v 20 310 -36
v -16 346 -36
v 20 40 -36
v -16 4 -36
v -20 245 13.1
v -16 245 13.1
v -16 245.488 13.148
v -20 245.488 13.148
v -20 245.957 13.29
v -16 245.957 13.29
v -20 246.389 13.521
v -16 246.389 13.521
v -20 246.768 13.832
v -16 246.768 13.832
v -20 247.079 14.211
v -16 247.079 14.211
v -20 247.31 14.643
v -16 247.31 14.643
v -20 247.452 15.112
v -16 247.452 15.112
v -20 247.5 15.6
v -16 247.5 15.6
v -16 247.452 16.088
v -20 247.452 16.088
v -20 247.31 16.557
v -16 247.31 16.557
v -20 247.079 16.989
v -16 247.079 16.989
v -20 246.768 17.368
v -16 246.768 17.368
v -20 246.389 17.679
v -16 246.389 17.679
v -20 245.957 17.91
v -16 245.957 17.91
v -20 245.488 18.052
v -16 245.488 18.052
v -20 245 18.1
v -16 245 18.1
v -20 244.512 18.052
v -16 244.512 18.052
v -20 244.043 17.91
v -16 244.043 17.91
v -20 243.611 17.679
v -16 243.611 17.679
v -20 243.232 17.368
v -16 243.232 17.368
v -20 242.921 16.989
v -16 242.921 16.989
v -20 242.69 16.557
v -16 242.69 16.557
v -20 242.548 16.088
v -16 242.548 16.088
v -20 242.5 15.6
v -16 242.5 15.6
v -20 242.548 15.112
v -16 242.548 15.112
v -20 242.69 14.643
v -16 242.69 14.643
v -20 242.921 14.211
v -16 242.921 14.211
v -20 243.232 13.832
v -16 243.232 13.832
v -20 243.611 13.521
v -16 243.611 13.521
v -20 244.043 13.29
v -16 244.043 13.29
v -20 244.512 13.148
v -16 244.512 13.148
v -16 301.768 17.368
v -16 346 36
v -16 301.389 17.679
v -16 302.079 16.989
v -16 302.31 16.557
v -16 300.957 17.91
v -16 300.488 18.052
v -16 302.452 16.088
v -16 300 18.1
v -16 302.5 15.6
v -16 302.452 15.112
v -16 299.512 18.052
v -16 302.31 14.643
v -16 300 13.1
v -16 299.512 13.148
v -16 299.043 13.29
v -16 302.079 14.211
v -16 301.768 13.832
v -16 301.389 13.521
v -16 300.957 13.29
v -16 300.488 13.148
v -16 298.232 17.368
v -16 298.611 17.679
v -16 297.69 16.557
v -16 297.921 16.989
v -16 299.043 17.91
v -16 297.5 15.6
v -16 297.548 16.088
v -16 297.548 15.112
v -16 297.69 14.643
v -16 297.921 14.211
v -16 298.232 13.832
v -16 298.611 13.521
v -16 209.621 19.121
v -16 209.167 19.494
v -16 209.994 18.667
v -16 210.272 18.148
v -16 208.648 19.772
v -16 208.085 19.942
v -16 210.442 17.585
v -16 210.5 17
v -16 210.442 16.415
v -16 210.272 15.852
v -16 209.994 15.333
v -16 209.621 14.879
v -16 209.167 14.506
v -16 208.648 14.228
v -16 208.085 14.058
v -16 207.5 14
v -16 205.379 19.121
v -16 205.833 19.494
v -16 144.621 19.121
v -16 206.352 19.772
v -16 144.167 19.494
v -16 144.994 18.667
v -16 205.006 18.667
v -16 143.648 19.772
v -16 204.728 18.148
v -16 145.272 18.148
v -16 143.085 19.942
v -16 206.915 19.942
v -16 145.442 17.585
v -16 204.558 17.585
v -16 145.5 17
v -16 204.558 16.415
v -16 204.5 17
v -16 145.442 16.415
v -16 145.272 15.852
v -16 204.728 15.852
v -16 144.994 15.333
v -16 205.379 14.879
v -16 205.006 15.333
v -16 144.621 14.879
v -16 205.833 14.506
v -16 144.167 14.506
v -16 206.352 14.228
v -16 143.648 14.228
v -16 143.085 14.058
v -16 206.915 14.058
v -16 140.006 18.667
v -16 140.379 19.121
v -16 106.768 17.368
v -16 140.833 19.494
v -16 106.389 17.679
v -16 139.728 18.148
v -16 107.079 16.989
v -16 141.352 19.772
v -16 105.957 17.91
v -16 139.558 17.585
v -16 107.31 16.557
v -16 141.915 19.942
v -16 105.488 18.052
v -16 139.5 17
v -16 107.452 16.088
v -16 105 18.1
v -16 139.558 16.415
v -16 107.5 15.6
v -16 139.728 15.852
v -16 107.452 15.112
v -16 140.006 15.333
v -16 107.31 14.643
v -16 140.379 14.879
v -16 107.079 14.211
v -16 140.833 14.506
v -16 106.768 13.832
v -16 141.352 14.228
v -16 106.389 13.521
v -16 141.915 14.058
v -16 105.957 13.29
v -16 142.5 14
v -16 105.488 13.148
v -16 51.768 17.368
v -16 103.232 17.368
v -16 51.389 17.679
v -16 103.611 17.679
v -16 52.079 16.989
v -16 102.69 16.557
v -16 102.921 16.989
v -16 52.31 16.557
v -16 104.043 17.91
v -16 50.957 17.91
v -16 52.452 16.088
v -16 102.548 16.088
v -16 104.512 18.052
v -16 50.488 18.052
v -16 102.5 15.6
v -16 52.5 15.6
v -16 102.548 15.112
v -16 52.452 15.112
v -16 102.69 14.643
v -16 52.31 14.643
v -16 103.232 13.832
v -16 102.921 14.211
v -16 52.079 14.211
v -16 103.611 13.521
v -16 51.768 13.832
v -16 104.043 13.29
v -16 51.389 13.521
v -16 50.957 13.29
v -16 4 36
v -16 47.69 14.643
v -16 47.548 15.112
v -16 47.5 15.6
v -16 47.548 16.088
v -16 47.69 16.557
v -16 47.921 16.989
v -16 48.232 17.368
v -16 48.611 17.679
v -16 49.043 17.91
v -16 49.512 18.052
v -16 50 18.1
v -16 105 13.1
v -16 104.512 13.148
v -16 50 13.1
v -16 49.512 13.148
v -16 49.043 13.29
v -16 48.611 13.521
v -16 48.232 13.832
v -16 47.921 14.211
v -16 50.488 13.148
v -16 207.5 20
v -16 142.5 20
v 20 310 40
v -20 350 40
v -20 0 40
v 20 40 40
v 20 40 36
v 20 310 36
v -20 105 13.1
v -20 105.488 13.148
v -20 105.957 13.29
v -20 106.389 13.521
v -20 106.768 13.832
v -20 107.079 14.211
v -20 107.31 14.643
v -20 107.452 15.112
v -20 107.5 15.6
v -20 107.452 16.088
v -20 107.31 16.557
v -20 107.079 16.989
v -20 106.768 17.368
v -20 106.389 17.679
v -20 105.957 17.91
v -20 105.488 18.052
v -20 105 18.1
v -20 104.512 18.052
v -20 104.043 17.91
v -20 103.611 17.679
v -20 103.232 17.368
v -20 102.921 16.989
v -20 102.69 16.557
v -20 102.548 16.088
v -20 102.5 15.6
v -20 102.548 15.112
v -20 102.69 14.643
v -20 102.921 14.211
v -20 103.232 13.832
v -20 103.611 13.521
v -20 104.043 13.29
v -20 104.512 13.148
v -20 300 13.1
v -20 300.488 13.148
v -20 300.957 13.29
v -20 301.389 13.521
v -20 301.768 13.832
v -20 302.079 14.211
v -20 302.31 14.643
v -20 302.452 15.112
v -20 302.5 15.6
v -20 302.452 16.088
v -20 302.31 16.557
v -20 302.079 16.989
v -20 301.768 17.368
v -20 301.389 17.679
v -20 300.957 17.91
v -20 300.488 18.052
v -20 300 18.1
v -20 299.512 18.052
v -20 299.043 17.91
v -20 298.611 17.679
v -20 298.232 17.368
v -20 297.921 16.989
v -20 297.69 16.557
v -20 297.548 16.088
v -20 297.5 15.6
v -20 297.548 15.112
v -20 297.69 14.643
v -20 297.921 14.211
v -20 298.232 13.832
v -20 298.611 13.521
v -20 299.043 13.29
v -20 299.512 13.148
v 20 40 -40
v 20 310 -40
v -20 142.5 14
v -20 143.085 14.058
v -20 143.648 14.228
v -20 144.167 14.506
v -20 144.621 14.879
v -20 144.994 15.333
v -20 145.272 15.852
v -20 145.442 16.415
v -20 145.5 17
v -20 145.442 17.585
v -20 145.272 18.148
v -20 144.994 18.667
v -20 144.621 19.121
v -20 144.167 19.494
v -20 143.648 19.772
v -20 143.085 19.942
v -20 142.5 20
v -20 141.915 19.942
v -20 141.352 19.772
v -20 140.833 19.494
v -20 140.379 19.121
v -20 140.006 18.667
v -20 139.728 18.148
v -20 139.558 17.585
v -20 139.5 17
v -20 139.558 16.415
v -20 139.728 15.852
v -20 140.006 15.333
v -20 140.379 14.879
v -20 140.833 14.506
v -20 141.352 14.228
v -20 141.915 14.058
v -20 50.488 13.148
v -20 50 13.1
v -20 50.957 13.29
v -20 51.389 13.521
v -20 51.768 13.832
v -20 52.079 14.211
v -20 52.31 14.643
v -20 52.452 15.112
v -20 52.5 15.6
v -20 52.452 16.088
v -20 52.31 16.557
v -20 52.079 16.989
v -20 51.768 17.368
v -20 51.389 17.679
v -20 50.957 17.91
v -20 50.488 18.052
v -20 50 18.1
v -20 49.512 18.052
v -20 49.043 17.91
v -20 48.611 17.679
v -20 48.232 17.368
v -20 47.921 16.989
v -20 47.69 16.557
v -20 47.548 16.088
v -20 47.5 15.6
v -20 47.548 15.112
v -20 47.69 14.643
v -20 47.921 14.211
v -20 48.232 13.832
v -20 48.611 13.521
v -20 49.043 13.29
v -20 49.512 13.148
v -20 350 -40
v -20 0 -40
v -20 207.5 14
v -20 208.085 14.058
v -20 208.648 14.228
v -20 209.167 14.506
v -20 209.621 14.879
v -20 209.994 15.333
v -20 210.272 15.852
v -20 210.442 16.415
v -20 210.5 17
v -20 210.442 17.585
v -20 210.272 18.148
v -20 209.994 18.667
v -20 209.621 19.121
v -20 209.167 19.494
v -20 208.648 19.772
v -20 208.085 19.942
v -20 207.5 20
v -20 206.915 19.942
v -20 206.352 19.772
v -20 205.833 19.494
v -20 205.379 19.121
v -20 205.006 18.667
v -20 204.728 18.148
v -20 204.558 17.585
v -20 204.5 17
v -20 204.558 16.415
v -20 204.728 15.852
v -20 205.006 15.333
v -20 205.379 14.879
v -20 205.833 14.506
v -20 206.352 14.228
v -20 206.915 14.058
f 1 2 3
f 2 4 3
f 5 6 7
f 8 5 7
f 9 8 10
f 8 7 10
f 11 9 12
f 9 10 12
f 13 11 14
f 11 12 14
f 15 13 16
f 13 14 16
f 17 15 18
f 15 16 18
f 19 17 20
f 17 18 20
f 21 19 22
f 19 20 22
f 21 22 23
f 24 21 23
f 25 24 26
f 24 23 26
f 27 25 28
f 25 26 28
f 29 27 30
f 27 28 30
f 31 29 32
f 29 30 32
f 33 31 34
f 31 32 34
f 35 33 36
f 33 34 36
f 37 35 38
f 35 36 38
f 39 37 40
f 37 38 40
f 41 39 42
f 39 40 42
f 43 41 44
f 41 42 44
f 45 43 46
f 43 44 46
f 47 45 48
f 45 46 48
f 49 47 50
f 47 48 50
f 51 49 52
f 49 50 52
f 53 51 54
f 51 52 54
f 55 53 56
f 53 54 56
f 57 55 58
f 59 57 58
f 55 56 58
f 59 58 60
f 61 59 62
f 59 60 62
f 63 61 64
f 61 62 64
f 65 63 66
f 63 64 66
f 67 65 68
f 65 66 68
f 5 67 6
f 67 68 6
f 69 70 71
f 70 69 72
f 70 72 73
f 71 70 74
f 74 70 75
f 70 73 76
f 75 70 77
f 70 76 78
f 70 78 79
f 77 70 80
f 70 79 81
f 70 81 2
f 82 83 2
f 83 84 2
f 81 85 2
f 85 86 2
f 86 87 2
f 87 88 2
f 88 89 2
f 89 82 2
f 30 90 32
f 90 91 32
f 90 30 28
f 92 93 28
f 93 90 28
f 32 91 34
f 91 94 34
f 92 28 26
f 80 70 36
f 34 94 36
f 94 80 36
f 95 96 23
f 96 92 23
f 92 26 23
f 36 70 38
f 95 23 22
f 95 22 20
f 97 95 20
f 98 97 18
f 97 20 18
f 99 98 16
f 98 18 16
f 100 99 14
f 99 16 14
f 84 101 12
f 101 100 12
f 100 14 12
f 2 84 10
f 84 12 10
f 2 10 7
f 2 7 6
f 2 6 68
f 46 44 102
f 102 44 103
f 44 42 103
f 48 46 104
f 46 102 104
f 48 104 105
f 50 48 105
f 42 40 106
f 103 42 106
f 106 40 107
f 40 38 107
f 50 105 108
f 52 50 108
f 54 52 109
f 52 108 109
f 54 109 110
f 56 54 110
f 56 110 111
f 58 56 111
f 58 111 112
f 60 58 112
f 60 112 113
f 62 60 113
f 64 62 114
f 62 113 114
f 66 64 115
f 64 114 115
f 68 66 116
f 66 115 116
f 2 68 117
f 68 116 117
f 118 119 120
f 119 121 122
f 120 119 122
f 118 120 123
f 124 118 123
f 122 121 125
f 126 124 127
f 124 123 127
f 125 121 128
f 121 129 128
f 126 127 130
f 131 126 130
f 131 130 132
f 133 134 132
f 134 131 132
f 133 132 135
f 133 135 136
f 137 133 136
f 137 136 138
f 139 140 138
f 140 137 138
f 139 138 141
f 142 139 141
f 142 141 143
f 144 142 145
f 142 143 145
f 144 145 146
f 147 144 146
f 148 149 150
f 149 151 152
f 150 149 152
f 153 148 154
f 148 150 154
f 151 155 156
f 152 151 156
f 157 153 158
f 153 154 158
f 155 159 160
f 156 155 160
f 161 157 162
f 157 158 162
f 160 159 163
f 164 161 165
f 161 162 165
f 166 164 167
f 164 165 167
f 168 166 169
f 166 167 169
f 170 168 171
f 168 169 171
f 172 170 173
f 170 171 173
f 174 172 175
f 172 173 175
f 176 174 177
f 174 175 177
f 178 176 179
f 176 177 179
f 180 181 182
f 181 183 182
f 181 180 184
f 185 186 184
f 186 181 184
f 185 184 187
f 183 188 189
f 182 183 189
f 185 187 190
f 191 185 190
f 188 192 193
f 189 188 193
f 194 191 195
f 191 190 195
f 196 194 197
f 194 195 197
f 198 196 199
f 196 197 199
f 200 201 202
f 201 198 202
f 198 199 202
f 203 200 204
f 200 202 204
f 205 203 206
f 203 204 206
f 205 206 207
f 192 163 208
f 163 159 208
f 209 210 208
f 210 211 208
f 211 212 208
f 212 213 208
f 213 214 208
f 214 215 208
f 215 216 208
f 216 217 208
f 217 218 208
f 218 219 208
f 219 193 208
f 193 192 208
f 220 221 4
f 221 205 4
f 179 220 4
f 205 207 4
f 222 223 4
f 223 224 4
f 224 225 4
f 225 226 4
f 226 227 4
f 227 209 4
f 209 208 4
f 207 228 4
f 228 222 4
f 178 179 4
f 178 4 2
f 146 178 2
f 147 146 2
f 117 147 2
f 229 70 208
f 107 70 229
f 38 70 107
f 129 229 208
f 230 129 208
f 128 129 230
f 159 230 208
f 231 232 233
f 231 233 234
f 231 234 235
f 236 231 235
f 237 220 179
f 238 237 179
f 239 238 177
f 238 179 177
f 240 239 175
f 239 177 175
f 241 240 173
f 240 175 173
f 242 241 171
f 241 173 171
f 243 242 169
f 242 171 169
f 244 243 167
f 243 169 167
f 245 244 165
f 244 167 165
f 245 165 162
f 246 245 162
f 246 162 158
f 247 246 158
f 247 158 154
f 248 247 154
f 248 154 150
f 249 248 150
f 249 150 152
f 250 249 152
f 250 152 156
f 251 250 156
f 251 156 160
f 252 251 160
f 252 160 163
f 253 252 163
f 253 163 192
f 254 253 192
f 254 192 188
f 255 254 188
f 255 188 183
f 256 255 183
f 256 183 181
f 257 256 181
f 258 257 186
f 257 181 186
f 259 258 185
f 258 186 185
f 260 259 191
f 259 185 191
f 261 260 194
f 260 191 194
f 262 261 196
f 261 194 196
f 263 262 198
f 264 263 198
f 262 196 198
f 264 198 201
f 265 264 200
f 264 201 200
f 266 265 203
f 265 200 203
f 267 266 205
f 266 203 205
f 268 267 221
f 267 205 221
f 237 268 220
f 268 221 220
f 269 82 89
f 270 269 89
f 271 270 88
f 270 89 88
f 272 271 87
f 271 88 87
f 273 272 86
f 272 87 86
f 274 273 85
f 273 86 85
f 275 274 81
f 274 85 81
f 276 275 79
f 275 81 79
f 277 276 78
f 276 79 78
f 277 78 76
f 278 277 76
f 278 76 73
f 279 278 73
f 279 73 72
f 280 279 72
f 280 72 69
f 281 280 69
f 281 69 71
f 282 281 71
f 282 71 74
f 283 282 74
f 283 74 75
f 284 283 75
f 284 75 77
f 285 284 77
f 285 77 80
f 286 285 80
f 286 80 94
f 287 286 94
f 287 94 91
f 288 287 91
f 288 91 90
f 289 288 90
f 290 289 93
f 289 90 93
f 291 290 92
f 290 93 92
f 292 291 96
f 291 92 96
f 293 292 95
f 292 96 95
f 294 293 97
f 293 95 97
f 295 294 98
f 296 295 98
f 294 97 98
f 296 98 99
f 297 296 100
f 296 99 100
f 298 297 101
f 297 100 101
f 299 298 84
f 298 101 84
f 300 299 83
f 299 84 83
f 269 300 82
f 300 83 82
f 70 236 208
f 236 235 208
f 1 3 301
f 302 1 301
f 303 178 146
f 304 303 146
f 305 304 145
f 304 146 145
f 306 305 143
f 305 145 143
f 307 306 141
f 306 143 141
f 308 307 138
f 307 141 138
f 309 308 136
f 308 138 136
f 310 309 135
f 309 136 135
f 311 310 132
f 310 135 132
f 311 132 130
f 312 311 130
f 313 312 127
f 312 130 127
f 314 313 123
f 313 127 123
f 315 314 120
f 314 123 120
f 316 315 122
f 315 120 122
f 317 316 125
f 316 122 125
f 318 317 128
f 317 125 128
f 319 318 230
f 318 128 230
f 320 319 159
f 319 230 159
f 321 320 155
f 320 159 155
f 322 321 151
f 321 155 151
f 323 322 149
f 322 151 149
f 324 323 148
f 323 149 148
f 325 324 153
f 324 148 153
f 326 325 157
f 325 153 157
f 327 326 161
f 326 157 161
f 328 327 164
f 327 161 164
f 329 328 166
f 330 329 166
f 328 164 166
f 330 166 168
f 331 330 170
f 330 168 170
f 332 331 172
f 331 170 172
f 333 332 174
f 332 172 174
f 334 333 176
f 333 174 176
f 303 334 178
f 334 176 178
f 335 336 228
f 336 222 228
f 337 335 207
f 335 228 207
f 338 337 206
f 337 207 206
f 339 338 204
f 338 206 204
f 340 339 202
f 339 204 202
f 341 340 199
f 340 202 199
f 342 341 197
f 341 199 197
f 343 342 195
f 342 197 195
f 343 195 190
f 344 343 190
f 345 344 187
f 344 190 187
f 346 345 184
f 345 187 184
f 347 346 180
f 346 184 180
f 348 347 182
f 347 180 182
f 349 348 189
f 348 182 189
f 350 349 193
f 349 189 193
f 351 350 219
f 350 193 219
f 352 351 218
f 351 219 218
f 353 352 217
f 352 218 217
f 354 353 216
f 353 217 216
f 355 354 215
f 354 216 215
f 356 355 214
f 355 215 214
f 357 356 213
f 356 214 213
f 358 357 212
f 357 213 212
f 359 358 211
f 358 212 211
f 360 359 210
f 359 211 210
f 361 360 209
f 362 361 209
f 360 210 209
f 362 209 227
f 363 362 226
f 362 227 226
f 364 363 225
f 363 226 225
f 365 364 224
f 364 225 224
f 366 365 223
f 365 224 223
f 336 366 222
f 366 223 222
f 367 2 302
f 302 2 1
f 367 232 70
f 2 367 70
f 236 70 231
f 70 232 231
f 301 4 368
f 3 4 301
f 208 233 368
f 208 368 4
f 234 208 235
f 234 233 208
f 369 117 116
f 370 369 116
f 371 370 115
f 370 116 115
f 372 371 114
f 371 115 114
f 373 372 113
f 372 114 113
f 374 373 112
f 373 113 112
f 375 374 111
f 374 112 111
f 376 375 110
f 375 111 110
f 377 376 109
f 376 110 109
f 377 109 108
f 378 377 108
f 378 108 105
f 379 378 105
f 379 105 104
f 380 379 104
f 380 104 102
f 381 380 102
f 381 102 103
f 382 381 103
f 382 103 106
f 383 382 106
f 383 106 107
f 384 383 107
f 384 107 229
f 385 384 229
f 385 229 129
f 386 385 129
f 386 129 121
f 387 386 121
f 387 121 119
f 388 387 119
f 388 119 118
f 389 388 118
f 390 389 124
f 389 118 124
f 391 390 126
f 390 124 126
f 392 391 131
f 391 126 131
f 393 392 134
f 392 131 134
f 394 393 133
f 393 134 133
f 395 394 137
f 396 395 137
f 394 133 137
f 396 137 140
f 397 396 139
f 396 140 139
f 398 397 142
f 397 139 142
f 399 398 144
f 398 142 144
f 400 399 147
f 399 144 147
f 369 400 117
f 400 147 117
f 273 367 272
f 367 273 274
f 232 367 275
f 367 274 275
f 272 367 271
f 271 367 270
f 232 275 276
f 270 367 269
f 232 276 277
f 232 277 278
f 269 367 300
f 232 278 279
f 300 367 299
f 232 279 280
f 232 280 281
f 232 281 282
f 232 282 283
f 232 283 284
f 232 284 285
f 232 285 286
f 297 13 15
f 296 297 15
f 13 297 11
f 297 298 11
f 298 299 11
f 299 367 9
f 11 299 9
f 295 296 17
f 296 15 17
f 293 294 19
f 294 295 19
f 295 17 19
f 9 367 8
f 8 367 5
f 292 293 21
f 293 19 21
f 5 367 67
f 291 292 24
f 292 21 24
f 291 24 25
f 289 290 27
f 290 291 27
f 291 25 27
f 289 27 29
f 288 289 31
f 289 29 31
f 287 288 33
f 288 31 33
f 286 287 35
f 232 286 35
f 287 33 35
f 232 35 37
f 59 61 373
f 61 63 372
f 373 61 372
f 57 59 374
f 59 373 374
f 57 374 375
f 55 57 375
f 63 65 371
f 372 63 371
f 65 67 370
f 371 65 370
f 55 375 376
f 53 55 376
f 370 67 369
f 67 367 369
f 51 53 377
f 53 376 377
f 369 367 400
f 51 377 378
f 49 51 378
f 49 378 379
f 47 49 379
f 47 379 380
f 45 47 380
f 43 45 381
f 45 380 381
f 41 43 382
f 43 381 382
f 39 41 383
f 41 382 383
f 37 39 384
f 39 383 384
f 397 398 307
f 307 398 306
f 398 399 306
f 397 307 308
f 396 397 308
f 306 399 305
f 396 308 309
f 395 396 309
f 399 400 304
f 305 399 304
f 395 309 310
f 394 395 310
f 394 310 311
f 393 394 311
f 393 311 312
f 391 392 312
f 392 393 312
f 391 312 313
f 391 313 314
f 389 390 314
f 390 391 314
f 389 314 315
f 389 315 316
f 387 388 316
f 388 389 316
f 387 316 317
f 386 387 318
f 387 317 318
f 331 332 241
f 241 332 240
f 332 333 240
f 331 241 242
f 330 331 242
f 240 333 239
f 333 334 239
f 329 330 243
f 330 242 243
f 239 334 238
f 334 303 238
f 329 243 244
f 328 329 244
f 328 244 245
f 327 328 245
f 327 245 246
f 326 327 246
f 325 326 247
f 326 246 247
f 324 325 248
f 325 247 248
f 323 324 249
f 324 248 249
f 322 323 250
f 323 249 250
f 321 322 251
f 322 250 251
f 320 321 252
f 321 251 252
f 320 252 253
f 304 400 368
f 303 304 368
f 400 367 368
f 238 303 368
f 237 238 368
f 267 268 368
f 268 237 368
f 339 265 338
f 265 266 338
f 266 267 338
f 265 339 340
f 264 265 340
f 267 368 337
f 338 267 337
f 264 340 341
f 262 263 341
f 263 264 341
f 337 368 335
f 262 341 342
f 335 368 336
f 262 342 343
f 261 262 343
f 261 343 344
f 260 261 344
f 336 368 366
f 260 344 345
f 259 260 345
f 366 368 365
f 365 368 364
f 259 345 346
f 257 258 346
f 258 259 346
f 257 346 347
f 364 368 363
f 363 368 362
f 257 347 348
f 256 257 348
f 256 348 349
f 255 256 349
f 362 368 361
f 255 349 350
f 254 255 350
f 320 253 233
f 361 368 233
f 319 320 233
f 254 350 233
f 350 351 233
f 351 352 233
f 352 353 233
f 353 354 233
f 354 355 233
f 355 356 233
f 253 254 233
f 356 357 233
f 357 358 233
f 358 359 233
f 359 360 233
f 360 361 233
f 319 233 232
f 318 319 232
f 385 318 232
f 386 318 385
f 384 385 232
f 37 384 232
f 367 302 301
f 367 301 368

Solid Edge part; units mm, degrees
sketch "Sketch1" plane through (0, 0, 0) normal (0, -1, 0) x (1, 0, 0)
  line L0 (20, 36) -> (-16, 36)
  line L1 (-16, 36) -> (-16, -36)
  line L2 (-16, -36) -> (20, -36)
  line L3 (20, -36) -> (20, -40)
  line L4 (20, -40) -> (-20, -40)
  line L5 (-20, -40) -> (-20, 40)
  line L6 (-20, 40) -> (20, 40)
  line L7 (20, 40) -> (20, 36)
  dimension "D1" = 80
  dimension "D2" = 40
  dimension "D3" = 4
  dimension "D4" = 4
extrude "Protrusion1" add sketch "Sketch1" against normal blind 350
sketch "Sketch2" plane through (0, 175, 40) normal (0, 0, 1) x (0, 1, 0)
  line L0 (-175, 20) -> (-135, -20)
extrude "Cutout1" cut sketch "Sketch2" against normal through all material side at (0.0354, 19.9646, 40)
sketch "Sketch3" plane through (0, 175, 40) normal (0, 0, 1) x (0, 1, 0)
  line L0 (175, 20) -> (135, -20)
extrude "Cutout2" cut sketch "Sketch3" against normal through all material side at (0.0354, 330.0354, 40)
hole "Bohrung_1" at (-16, 142.5, 17) direction (-1, 0, 0) diameter 6 end up to next
hole "Hole1" at (-16, 207.5, 17) direction (-1, 0, 0) diameter 6 end up to next
hole "Bohrung_3" at (-16, 50, 15.6) direction (-1, 0, 0) diameter 5 end up to next
hole "Hole2" at (-16, 105, 15.6) direction (-1, 0, 0) diameter 5 end up to next
hole "Hole3" at (-16, 245, 15.6) direction (-1, 0, 0) diameter 5 end up to next
hole "Hole4" at (-16, 300, 15.6) direction (-1, 0, 0) diameter 5 end up to next
properties material "AlMgSi 0,5-1"
